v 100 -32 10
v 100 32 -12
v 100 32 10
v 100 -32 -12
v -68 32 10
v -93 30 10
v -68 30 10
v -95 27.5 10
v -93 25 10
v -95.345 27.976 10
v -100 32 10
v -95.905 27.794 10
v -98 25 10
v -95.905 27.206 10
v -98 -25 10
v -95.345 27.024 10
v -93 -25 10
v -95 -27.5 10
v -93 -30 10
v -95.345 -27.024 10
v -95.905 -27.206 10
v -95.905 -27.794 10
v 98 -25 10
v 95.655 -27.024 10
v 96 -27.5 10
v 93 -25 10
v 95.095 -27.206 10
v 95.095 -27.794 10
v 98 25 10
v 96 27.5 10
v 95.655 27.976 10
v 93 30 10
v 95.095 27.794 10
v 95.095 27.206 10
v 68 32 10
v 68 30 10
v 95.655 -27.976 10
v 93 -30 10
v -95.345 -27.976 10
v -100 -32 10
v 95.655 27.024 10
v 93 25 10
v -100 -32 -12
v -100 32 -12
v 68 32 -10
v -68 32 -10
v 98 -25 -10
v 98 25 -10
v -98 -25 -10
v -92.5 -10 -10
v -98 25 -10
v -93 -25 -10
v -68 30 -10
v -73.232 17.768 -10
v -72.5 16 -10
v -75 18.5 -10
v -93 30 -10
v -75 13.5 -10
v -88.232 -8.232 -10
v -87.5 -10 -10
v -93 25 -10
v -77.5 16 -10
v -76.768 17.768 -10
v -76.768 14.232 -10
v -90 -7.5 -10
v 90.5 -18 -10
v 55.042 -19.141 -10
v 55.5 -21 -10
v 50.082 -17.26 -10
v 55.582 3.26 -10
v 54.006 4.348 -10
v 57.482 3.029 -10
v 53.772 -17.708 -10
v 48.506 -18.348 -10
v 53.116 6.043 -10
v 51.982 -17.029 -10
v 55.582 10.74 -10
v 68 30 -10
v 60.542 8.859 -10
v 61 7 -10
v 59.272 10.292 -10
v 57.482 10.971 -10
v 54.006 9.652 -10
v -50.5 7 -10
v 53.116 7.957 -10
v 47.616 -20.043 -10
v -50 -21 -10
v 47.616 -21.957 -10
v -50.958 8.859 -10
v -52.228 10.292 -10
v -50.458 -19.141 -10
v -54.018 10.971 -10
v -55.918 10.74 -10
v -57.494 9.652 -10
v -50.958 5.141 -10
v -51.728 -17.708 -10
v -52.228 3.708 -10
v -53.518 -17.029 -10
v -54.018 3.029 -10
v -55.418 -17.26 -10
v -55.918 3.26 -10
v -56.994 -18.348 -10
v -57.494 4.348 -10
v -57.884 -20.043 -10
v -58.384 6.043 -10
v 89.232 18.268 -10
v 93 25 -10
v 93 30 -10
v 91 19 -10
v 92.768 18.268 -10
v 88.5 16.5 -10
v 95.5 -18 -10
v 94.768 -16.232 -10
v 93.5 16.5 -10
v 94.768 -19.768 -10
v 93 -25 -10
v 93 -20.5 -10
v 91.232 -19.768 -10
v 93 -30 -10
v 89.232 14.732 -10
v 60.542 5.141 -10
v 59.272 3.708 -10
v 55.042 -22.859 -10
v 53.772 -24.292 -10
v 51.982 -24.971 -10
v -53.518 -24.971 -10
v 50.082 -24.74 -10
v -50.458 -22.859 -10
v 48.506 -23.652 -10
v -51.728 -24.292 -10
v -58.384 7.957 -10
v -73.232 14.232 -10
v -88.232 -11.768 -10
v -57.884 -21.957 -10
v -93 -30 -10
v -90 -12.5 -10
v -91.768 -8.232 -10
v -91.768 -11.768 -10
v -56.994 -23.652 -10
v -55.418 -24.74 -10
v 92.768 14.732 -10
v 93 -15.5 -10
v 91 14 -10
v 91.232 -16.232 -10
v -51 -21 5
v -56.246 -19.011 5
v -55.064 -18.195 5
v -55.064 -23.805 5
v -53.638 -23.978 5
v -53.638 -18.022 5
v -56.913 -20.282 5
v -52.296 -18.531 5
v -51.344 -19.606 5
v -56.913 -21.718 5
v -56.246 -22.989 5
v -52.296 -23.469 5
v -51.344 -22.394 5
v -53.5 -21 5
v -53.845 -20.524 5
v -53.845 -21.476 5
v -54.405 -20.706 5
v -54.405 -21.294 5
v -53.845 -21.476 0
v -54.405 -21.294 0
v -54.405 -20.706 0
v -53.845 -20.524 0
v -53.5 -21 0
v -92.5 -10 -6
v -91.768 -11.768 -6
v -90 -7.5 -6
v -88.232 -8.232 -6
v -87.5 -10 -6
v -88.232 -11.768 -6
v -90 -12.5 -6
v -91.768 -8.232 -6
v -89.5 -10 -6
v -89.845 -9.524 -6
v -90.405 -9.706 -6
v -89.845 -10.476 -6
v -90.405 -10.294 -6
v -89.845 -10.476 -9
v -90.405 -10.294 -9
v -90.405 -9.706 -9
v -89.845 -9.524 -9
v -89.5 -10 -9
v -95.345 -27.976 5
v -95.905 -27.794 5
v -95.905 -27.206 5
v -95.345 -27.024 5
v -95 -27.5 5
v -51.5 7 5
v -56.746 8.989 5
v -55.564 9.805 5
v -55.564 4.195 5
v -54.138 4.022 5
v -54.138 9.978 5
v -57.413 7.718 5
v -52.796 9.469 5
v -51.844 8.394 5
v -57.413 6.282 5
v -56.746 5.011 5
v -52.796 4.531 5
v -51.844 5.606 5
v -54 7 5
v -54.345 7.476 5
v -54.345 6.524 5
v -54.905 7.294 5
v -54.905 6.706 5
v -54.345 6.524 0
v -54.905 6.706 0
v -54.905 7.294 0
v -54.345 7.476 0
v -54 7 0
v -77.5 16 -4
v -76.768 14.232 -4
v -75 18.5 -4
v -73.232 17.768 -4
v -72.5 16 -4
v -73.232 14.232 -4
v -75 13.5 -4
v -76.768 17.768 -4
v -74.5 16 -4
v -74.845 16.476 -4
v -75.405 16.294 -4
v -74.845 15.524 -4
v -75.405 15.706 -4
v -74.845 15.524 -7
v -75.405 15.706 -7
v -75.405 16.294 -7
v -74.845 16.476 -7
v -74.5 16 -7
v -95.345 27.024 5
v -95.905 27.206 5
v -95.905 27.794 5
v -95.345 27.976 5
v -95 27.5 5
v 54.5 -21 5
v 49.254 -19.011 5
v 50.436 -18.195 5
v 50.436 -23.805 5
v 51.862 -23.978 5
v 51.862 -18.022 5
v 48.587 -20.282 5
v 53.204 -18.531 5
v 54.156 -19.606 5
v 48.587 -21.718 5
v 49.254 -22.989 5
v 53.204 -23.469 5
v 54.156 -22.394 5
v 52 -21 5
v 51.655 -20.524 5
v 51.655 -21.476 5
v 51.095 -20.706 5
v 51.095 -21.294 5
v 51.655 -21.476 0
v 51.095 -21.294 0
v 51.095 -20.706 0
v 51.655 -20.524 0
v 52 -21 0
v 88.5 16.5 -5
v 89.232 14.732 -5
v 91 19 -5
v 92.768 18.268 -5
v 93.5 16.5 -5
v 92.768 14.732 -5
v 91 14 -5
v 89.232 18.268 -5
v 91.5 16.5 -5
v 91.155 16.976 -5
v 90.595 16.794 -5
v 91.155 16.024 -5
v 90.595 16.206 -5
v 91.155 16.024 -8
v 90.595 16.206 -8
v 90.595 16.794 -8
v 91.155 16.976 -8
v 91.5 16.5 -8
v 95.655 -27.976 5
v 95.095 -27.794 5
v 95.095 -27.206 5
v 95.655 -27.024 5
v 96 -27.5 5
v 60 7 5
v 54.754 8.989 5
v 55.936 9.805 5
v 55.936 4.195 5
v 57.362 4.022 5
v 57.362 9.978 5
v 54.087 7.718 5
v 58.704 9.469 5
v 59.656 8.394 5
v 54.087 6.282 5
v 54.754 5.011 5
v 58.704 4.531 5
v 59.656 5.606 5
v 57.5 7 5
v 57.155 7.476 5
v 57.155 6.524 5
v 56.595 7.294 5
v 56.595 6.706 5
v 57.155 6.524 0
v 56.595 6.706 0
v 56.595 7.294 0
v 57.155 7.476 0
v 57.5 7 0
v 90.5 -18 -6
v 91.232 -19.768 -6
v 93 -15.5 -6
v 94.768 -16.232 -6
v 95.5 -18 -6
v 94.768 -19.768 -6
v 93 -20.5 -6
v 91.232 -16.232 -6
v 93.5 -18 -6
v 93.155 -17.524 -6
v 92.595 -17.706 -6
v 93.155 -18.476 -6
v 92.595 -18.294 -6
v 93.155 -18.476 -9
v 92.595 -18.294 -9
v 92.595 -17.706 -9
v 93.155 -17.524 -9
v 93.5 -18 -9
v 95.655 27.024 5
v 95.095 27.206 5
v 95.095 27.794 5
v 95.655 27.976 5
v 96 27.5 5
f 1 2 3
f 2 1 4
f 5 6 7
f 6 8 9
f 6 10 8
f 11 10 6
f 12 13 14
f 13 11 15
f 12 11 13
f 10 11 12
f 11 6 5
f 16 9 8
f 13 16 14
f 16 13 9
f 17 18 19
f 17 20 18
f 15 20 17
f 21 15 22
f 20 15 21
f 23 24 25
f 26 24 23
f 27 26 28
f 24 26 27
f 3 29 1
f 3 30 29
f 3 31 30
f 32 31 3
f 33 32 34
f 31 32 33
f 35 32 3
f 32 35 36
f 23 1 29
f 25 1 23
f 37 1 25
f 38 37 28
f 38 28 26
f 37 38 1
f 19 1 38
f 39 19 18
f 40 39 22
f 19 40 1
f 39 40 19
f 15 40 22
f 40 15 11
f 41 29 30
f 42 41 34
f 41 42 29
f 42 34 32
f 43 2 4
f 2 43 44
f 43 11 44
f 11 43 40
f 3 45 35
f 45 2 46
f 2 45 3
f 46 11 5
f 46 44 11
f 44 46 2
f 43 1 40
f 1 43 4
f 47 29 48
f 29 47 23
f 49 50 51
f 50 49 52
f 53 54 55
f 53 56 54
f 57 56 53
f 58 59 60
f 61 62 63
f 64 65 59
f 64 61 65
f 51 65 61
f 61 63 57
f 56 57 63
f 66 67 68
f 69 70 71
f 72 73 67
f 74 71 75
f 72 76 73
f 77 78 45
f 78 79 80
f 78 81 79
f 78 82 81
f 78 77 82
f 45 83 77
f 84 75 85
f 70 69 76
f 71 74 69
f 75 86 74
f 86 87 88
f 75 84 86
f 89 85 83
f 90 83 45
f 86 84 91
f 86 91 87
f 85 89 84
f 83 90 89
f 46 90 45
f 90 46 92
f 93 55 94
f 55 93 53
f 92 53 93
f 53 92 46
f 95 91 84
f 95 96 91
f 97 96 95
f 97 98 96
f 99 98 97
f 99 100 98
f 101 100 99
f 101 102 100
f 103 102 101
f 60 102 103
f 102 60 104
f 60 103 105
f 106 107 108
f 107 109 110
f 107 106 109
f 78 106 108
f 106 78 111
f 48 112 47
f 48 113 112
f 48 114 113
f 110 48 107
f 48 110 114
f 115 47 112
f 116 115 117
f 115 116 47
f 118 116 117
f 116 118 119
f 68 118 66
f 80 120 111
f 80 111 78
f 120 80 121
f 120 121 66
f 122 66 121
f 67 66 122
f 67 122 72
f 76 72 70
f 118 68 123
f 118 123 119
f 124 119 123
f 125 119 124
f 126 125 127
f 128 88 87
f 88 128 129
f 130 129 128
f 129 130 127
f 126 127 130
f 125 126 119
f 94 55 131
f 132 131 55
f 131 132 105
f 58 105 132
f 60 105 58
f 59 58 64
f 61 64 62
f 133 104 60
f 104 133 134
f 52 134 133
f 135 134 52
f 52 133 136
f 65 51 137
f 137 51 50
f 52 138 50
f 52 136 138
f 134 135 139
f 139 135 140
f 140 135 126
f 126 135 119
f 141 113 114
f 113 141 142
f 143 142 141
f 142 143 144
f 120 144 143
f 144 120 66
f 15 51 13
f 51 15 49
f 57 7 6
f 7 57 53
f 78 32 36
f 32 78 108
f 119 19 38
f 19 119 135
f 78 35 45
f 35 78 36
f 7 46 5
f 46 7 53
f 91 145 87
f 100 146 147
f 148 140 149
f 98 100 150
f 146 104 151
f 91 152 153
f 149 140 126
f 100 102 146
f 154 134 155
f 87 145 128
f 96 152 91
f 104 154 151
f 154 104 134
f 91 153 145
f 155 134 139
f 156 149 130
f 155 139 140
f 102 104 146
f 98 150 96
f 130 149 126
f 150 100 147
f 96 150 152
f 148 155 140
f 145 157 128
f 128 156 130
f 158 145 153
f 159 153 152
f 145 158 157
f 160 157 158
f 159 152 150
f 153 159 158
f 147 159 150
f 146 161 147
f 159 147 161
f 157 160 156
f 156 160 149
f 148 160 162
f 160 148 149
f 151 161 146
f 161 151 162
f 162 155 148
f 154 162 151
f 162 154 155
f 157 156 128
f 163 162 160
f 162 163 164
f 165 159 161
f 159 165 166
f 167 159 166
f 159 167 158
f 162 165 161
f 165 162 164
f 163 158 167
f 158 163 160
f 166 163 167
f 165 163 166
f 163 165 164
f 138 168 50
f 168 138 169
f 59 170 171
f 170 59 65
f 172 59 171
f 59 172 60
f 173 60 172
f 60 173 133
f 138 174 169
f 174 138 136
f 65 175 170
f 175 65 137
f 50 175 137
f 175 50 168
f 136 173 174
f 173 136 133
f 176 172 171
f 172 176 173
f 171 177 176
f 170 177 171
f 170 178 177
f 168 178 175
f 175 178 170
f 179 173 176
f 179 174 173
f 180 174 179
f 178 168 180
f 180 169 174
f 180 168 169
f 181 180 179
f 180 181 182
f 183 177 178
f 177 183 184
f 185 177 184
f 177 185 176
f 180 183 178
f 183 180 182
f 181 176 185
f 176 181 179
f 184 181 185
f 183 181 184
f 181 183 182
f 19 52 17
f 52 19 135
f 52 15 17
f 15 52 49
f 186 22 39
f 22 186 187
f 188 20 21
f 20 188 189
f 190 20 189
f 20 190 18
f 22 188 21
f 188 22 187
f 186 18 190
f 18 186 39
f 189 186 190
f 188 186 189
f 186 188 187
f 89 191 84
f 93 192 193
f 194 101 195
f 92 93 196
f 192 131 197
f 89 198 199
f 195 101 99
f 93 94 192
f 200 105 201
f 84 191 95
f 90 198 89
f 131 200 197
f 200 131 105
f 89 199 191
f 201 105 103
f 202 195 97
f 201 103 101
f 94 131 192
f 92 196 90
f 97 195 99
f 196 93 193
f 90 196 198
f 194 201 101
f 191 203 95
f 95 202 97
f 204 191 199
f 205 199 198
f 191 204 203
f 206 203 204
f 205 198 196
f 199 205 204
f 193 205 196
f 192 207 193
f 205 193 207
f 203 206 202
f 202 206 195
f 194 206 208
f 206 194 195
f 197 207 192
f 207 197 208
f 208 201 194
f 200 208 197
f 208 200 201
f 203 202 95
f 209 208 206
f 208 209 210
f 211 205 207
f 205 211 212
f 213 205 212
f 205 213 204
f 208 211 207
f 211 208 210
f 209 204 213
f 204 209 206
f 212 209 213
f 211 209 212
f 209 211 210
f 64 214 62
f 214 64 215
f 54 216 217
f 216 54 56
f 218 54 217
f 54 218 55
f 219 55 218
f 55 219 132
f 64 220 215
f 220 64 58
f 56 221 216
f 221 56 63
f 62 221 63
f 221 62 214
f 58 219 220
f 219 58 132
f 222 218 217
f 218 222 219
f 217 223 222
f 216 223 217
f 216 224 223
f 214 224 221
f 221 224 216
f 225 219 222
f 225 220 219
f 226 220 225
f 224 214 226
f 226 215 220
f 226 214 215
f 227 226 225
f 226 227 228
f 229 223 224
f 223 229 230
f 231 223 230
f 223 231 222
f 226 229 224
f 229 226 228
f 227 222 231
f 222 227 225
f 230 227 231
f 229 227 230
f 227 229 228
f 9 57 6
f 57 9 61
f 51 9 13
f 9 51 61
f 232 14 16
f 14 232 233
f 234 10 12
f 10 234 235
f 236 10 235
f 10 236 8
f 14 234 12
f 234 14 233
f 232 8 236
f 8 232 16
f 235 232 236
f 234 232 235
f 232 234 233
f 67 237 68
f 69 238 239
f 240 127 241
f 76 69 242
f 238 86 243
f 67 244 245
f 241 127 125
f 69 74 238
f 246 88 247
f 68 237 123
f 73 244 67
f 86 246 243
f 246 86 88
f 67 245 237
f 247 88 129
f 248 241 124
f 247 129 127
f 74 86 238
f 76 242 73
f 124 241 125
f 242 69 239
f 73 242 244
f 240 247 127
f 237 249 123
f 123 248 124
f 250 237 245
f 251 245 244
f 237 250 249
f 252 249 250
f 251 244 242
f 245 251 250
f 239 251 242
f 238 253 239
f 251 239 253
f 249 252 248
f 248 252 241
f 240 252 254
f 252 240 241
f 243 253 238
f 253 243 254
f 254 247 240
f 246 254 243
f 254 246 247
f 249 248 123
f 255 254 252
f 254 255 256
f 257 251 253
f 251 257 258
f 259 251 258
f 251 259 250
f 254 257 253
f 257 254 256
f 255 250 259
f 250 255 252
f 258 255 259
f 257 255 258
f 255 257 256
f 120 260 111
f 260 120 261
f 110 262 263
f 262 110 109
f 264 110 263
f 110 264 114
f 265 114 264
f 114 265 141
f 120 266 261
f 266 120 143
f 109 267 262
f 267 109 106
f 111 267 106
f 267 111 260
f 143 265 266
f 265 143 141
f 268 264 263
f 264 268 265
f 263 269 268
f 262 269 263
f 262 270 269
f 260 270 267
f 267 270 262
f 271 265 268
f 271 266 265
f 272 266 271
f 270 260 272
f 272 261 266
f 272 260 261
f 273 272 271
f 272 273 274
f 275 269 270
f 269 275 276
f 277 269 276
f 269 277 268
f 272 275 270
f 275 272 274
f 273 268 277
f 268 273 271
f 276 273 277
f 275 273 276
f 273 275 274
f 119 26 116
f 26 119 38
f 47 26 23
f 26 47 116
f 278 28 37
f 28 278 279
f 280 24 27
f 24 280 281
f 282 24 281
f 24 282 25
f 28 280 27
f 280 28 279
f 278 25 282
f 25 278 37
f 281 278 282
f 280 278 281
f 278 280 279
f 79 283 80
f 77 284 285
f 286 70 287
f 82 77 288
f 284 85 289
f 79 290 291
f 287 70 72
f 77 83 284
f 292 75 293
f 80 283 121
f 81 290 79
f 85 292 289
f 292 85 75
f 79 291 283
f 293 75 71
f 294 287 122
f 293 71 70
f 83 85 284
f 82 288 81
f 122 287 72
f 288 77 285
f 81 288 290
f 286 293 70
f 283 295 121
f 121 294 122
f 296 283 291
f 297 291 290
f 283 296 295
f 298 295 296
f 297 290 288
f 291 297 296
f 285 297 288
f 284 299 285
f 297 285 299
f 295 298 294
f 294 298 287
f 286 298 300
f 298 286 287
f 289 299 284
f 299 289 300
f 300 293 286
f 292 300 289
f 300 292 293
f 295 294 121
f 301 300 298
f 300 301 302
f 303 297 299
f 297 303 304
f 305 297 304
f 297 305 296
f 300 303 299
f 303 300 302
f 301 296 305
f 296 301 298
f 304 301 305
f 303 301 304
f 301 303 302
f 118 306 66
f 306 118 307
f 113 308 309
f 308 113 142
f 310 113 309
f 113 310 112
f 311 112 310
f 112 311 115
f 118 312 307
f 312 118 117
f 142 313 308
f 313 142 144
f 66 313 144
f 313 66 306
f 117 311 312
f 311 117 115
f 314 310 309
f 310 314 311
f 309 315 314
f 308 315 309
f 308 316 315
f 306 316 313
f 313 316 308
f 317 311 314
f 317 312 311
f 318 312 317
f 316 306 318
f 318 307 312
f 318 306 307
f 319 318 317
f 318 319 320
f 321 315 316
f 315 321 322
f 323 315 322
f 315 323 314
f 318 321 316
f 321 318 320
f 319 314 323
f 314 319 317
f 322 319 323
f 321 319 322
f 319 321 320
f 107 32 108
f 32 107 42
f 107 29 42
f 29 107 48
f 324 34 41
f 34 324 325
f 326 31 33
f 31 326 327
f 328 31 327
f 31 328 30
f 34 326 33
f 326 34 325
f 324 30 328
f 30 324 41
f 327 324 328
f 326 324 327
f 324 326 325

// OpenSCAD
echo(version=version());

T=2;        // box case thickness
P=30;       // padding for speakers
S=5;        // box pin thickness

W=200-T*2;  // box inside width
L=60;       // box inside length
H=20;       // box inside height

// box pins
BOX_PINS=[    // x, y, 0
    [-W/2+S/2, -L/2+S/2, 0],
    [-W/2+S/2,  L/2-S/2, 0],
    [ W/2-S/2, -L/2+S/2, 0],
    [ W/2-S/2,  L/2-S/2, 0]
  ];

// pins for board
PCB_PINS=[    // x, y
    [14, 9],
    [13.5, 37],
    [119.5, 9],
    [125, 37]
  ];

// pins for speakers
PIN_OFFSET=10;
SPK_PINS=[    // height, x, y
    [4, 10-T, 30-PIN_OFFSET],
    [6, 25-T, 56-PIN_OFFSET],
    [5, 187+T, 56.5-PIN_OFFSET],
    [4, 189+T, 22-PIN_OFFSET]
  ];

module BOX() {
  difference () {
    // outside box
    translate ([0, 0, -T/2]) {
      cube([W+T*2, L+T*2, H+T], center=true);
    }
    // inside box space
    cube([W, L, H], center=true);
    // box connectors door
    translate ([0, L/2+T/2, 0]) {
      cube([W-P*2, T, H], center=true);
    }
  }
}

module BOX_PIN() {
  // pin hole
  Hh=5;
  Rh=1;
  difference() {
    cube([S,S,H], center=true);
    translate ([0, 0, H/2-Hh/2]) {
      cylinder(h=Hh, r1=Rh/2, r2=Rh/2, center=true);
    }
  }
}

module PCB_PIN(dim) {  // dim is [x, y] array
  // pin
  Hb=15;
  Rb1=8;
  Rb2=6;
  // pin hole
  Hh=5;
  Rh=1;
  translate ([-W/2+P+dim[0], -L/2+dim[1], -H/2+Hb/2]) {
    difference() {
      cylinder(h=Hb, r1=Rb1/2, r2=Rb2/2, center=true, $fa=6);
      translate ([0, 0, Hb/2-Hh/2]) {
        cylinder(h=Hh, r1=Rh/2, r2=Rh/2, center=true);
      }
    }
  }
}

module SPK_PIN(dim) {  // dim is [h, x, y] array
  // pin
  Rs=5;
  // pin hole
  Hh=3;
  Rh=1;
  translate ([-W/2+dim[1], -L/2+dim[2], -H/2+dim[0]/2]) {
    difference() {
      cylinder(h=dim[0], r1=Rs/2, r2=Rs/2, center=true, $fa=6);
      translate ([0, 0, dim[0]/2-Hh/2]) {
        cylinder(h=Hh, r1=Rh/2, r2=Rh/2, center=true);
      }
    }
  }
}

BOX();
for ( i = [1 : 4] ) {
  PCB_PIN(PCB_PINS[i-1]);
  SPK_PIN(SPK_PINS[i-1]);
  translate (BOX_PINS[i-1]) {
    BOX_PIN();
  }
}
